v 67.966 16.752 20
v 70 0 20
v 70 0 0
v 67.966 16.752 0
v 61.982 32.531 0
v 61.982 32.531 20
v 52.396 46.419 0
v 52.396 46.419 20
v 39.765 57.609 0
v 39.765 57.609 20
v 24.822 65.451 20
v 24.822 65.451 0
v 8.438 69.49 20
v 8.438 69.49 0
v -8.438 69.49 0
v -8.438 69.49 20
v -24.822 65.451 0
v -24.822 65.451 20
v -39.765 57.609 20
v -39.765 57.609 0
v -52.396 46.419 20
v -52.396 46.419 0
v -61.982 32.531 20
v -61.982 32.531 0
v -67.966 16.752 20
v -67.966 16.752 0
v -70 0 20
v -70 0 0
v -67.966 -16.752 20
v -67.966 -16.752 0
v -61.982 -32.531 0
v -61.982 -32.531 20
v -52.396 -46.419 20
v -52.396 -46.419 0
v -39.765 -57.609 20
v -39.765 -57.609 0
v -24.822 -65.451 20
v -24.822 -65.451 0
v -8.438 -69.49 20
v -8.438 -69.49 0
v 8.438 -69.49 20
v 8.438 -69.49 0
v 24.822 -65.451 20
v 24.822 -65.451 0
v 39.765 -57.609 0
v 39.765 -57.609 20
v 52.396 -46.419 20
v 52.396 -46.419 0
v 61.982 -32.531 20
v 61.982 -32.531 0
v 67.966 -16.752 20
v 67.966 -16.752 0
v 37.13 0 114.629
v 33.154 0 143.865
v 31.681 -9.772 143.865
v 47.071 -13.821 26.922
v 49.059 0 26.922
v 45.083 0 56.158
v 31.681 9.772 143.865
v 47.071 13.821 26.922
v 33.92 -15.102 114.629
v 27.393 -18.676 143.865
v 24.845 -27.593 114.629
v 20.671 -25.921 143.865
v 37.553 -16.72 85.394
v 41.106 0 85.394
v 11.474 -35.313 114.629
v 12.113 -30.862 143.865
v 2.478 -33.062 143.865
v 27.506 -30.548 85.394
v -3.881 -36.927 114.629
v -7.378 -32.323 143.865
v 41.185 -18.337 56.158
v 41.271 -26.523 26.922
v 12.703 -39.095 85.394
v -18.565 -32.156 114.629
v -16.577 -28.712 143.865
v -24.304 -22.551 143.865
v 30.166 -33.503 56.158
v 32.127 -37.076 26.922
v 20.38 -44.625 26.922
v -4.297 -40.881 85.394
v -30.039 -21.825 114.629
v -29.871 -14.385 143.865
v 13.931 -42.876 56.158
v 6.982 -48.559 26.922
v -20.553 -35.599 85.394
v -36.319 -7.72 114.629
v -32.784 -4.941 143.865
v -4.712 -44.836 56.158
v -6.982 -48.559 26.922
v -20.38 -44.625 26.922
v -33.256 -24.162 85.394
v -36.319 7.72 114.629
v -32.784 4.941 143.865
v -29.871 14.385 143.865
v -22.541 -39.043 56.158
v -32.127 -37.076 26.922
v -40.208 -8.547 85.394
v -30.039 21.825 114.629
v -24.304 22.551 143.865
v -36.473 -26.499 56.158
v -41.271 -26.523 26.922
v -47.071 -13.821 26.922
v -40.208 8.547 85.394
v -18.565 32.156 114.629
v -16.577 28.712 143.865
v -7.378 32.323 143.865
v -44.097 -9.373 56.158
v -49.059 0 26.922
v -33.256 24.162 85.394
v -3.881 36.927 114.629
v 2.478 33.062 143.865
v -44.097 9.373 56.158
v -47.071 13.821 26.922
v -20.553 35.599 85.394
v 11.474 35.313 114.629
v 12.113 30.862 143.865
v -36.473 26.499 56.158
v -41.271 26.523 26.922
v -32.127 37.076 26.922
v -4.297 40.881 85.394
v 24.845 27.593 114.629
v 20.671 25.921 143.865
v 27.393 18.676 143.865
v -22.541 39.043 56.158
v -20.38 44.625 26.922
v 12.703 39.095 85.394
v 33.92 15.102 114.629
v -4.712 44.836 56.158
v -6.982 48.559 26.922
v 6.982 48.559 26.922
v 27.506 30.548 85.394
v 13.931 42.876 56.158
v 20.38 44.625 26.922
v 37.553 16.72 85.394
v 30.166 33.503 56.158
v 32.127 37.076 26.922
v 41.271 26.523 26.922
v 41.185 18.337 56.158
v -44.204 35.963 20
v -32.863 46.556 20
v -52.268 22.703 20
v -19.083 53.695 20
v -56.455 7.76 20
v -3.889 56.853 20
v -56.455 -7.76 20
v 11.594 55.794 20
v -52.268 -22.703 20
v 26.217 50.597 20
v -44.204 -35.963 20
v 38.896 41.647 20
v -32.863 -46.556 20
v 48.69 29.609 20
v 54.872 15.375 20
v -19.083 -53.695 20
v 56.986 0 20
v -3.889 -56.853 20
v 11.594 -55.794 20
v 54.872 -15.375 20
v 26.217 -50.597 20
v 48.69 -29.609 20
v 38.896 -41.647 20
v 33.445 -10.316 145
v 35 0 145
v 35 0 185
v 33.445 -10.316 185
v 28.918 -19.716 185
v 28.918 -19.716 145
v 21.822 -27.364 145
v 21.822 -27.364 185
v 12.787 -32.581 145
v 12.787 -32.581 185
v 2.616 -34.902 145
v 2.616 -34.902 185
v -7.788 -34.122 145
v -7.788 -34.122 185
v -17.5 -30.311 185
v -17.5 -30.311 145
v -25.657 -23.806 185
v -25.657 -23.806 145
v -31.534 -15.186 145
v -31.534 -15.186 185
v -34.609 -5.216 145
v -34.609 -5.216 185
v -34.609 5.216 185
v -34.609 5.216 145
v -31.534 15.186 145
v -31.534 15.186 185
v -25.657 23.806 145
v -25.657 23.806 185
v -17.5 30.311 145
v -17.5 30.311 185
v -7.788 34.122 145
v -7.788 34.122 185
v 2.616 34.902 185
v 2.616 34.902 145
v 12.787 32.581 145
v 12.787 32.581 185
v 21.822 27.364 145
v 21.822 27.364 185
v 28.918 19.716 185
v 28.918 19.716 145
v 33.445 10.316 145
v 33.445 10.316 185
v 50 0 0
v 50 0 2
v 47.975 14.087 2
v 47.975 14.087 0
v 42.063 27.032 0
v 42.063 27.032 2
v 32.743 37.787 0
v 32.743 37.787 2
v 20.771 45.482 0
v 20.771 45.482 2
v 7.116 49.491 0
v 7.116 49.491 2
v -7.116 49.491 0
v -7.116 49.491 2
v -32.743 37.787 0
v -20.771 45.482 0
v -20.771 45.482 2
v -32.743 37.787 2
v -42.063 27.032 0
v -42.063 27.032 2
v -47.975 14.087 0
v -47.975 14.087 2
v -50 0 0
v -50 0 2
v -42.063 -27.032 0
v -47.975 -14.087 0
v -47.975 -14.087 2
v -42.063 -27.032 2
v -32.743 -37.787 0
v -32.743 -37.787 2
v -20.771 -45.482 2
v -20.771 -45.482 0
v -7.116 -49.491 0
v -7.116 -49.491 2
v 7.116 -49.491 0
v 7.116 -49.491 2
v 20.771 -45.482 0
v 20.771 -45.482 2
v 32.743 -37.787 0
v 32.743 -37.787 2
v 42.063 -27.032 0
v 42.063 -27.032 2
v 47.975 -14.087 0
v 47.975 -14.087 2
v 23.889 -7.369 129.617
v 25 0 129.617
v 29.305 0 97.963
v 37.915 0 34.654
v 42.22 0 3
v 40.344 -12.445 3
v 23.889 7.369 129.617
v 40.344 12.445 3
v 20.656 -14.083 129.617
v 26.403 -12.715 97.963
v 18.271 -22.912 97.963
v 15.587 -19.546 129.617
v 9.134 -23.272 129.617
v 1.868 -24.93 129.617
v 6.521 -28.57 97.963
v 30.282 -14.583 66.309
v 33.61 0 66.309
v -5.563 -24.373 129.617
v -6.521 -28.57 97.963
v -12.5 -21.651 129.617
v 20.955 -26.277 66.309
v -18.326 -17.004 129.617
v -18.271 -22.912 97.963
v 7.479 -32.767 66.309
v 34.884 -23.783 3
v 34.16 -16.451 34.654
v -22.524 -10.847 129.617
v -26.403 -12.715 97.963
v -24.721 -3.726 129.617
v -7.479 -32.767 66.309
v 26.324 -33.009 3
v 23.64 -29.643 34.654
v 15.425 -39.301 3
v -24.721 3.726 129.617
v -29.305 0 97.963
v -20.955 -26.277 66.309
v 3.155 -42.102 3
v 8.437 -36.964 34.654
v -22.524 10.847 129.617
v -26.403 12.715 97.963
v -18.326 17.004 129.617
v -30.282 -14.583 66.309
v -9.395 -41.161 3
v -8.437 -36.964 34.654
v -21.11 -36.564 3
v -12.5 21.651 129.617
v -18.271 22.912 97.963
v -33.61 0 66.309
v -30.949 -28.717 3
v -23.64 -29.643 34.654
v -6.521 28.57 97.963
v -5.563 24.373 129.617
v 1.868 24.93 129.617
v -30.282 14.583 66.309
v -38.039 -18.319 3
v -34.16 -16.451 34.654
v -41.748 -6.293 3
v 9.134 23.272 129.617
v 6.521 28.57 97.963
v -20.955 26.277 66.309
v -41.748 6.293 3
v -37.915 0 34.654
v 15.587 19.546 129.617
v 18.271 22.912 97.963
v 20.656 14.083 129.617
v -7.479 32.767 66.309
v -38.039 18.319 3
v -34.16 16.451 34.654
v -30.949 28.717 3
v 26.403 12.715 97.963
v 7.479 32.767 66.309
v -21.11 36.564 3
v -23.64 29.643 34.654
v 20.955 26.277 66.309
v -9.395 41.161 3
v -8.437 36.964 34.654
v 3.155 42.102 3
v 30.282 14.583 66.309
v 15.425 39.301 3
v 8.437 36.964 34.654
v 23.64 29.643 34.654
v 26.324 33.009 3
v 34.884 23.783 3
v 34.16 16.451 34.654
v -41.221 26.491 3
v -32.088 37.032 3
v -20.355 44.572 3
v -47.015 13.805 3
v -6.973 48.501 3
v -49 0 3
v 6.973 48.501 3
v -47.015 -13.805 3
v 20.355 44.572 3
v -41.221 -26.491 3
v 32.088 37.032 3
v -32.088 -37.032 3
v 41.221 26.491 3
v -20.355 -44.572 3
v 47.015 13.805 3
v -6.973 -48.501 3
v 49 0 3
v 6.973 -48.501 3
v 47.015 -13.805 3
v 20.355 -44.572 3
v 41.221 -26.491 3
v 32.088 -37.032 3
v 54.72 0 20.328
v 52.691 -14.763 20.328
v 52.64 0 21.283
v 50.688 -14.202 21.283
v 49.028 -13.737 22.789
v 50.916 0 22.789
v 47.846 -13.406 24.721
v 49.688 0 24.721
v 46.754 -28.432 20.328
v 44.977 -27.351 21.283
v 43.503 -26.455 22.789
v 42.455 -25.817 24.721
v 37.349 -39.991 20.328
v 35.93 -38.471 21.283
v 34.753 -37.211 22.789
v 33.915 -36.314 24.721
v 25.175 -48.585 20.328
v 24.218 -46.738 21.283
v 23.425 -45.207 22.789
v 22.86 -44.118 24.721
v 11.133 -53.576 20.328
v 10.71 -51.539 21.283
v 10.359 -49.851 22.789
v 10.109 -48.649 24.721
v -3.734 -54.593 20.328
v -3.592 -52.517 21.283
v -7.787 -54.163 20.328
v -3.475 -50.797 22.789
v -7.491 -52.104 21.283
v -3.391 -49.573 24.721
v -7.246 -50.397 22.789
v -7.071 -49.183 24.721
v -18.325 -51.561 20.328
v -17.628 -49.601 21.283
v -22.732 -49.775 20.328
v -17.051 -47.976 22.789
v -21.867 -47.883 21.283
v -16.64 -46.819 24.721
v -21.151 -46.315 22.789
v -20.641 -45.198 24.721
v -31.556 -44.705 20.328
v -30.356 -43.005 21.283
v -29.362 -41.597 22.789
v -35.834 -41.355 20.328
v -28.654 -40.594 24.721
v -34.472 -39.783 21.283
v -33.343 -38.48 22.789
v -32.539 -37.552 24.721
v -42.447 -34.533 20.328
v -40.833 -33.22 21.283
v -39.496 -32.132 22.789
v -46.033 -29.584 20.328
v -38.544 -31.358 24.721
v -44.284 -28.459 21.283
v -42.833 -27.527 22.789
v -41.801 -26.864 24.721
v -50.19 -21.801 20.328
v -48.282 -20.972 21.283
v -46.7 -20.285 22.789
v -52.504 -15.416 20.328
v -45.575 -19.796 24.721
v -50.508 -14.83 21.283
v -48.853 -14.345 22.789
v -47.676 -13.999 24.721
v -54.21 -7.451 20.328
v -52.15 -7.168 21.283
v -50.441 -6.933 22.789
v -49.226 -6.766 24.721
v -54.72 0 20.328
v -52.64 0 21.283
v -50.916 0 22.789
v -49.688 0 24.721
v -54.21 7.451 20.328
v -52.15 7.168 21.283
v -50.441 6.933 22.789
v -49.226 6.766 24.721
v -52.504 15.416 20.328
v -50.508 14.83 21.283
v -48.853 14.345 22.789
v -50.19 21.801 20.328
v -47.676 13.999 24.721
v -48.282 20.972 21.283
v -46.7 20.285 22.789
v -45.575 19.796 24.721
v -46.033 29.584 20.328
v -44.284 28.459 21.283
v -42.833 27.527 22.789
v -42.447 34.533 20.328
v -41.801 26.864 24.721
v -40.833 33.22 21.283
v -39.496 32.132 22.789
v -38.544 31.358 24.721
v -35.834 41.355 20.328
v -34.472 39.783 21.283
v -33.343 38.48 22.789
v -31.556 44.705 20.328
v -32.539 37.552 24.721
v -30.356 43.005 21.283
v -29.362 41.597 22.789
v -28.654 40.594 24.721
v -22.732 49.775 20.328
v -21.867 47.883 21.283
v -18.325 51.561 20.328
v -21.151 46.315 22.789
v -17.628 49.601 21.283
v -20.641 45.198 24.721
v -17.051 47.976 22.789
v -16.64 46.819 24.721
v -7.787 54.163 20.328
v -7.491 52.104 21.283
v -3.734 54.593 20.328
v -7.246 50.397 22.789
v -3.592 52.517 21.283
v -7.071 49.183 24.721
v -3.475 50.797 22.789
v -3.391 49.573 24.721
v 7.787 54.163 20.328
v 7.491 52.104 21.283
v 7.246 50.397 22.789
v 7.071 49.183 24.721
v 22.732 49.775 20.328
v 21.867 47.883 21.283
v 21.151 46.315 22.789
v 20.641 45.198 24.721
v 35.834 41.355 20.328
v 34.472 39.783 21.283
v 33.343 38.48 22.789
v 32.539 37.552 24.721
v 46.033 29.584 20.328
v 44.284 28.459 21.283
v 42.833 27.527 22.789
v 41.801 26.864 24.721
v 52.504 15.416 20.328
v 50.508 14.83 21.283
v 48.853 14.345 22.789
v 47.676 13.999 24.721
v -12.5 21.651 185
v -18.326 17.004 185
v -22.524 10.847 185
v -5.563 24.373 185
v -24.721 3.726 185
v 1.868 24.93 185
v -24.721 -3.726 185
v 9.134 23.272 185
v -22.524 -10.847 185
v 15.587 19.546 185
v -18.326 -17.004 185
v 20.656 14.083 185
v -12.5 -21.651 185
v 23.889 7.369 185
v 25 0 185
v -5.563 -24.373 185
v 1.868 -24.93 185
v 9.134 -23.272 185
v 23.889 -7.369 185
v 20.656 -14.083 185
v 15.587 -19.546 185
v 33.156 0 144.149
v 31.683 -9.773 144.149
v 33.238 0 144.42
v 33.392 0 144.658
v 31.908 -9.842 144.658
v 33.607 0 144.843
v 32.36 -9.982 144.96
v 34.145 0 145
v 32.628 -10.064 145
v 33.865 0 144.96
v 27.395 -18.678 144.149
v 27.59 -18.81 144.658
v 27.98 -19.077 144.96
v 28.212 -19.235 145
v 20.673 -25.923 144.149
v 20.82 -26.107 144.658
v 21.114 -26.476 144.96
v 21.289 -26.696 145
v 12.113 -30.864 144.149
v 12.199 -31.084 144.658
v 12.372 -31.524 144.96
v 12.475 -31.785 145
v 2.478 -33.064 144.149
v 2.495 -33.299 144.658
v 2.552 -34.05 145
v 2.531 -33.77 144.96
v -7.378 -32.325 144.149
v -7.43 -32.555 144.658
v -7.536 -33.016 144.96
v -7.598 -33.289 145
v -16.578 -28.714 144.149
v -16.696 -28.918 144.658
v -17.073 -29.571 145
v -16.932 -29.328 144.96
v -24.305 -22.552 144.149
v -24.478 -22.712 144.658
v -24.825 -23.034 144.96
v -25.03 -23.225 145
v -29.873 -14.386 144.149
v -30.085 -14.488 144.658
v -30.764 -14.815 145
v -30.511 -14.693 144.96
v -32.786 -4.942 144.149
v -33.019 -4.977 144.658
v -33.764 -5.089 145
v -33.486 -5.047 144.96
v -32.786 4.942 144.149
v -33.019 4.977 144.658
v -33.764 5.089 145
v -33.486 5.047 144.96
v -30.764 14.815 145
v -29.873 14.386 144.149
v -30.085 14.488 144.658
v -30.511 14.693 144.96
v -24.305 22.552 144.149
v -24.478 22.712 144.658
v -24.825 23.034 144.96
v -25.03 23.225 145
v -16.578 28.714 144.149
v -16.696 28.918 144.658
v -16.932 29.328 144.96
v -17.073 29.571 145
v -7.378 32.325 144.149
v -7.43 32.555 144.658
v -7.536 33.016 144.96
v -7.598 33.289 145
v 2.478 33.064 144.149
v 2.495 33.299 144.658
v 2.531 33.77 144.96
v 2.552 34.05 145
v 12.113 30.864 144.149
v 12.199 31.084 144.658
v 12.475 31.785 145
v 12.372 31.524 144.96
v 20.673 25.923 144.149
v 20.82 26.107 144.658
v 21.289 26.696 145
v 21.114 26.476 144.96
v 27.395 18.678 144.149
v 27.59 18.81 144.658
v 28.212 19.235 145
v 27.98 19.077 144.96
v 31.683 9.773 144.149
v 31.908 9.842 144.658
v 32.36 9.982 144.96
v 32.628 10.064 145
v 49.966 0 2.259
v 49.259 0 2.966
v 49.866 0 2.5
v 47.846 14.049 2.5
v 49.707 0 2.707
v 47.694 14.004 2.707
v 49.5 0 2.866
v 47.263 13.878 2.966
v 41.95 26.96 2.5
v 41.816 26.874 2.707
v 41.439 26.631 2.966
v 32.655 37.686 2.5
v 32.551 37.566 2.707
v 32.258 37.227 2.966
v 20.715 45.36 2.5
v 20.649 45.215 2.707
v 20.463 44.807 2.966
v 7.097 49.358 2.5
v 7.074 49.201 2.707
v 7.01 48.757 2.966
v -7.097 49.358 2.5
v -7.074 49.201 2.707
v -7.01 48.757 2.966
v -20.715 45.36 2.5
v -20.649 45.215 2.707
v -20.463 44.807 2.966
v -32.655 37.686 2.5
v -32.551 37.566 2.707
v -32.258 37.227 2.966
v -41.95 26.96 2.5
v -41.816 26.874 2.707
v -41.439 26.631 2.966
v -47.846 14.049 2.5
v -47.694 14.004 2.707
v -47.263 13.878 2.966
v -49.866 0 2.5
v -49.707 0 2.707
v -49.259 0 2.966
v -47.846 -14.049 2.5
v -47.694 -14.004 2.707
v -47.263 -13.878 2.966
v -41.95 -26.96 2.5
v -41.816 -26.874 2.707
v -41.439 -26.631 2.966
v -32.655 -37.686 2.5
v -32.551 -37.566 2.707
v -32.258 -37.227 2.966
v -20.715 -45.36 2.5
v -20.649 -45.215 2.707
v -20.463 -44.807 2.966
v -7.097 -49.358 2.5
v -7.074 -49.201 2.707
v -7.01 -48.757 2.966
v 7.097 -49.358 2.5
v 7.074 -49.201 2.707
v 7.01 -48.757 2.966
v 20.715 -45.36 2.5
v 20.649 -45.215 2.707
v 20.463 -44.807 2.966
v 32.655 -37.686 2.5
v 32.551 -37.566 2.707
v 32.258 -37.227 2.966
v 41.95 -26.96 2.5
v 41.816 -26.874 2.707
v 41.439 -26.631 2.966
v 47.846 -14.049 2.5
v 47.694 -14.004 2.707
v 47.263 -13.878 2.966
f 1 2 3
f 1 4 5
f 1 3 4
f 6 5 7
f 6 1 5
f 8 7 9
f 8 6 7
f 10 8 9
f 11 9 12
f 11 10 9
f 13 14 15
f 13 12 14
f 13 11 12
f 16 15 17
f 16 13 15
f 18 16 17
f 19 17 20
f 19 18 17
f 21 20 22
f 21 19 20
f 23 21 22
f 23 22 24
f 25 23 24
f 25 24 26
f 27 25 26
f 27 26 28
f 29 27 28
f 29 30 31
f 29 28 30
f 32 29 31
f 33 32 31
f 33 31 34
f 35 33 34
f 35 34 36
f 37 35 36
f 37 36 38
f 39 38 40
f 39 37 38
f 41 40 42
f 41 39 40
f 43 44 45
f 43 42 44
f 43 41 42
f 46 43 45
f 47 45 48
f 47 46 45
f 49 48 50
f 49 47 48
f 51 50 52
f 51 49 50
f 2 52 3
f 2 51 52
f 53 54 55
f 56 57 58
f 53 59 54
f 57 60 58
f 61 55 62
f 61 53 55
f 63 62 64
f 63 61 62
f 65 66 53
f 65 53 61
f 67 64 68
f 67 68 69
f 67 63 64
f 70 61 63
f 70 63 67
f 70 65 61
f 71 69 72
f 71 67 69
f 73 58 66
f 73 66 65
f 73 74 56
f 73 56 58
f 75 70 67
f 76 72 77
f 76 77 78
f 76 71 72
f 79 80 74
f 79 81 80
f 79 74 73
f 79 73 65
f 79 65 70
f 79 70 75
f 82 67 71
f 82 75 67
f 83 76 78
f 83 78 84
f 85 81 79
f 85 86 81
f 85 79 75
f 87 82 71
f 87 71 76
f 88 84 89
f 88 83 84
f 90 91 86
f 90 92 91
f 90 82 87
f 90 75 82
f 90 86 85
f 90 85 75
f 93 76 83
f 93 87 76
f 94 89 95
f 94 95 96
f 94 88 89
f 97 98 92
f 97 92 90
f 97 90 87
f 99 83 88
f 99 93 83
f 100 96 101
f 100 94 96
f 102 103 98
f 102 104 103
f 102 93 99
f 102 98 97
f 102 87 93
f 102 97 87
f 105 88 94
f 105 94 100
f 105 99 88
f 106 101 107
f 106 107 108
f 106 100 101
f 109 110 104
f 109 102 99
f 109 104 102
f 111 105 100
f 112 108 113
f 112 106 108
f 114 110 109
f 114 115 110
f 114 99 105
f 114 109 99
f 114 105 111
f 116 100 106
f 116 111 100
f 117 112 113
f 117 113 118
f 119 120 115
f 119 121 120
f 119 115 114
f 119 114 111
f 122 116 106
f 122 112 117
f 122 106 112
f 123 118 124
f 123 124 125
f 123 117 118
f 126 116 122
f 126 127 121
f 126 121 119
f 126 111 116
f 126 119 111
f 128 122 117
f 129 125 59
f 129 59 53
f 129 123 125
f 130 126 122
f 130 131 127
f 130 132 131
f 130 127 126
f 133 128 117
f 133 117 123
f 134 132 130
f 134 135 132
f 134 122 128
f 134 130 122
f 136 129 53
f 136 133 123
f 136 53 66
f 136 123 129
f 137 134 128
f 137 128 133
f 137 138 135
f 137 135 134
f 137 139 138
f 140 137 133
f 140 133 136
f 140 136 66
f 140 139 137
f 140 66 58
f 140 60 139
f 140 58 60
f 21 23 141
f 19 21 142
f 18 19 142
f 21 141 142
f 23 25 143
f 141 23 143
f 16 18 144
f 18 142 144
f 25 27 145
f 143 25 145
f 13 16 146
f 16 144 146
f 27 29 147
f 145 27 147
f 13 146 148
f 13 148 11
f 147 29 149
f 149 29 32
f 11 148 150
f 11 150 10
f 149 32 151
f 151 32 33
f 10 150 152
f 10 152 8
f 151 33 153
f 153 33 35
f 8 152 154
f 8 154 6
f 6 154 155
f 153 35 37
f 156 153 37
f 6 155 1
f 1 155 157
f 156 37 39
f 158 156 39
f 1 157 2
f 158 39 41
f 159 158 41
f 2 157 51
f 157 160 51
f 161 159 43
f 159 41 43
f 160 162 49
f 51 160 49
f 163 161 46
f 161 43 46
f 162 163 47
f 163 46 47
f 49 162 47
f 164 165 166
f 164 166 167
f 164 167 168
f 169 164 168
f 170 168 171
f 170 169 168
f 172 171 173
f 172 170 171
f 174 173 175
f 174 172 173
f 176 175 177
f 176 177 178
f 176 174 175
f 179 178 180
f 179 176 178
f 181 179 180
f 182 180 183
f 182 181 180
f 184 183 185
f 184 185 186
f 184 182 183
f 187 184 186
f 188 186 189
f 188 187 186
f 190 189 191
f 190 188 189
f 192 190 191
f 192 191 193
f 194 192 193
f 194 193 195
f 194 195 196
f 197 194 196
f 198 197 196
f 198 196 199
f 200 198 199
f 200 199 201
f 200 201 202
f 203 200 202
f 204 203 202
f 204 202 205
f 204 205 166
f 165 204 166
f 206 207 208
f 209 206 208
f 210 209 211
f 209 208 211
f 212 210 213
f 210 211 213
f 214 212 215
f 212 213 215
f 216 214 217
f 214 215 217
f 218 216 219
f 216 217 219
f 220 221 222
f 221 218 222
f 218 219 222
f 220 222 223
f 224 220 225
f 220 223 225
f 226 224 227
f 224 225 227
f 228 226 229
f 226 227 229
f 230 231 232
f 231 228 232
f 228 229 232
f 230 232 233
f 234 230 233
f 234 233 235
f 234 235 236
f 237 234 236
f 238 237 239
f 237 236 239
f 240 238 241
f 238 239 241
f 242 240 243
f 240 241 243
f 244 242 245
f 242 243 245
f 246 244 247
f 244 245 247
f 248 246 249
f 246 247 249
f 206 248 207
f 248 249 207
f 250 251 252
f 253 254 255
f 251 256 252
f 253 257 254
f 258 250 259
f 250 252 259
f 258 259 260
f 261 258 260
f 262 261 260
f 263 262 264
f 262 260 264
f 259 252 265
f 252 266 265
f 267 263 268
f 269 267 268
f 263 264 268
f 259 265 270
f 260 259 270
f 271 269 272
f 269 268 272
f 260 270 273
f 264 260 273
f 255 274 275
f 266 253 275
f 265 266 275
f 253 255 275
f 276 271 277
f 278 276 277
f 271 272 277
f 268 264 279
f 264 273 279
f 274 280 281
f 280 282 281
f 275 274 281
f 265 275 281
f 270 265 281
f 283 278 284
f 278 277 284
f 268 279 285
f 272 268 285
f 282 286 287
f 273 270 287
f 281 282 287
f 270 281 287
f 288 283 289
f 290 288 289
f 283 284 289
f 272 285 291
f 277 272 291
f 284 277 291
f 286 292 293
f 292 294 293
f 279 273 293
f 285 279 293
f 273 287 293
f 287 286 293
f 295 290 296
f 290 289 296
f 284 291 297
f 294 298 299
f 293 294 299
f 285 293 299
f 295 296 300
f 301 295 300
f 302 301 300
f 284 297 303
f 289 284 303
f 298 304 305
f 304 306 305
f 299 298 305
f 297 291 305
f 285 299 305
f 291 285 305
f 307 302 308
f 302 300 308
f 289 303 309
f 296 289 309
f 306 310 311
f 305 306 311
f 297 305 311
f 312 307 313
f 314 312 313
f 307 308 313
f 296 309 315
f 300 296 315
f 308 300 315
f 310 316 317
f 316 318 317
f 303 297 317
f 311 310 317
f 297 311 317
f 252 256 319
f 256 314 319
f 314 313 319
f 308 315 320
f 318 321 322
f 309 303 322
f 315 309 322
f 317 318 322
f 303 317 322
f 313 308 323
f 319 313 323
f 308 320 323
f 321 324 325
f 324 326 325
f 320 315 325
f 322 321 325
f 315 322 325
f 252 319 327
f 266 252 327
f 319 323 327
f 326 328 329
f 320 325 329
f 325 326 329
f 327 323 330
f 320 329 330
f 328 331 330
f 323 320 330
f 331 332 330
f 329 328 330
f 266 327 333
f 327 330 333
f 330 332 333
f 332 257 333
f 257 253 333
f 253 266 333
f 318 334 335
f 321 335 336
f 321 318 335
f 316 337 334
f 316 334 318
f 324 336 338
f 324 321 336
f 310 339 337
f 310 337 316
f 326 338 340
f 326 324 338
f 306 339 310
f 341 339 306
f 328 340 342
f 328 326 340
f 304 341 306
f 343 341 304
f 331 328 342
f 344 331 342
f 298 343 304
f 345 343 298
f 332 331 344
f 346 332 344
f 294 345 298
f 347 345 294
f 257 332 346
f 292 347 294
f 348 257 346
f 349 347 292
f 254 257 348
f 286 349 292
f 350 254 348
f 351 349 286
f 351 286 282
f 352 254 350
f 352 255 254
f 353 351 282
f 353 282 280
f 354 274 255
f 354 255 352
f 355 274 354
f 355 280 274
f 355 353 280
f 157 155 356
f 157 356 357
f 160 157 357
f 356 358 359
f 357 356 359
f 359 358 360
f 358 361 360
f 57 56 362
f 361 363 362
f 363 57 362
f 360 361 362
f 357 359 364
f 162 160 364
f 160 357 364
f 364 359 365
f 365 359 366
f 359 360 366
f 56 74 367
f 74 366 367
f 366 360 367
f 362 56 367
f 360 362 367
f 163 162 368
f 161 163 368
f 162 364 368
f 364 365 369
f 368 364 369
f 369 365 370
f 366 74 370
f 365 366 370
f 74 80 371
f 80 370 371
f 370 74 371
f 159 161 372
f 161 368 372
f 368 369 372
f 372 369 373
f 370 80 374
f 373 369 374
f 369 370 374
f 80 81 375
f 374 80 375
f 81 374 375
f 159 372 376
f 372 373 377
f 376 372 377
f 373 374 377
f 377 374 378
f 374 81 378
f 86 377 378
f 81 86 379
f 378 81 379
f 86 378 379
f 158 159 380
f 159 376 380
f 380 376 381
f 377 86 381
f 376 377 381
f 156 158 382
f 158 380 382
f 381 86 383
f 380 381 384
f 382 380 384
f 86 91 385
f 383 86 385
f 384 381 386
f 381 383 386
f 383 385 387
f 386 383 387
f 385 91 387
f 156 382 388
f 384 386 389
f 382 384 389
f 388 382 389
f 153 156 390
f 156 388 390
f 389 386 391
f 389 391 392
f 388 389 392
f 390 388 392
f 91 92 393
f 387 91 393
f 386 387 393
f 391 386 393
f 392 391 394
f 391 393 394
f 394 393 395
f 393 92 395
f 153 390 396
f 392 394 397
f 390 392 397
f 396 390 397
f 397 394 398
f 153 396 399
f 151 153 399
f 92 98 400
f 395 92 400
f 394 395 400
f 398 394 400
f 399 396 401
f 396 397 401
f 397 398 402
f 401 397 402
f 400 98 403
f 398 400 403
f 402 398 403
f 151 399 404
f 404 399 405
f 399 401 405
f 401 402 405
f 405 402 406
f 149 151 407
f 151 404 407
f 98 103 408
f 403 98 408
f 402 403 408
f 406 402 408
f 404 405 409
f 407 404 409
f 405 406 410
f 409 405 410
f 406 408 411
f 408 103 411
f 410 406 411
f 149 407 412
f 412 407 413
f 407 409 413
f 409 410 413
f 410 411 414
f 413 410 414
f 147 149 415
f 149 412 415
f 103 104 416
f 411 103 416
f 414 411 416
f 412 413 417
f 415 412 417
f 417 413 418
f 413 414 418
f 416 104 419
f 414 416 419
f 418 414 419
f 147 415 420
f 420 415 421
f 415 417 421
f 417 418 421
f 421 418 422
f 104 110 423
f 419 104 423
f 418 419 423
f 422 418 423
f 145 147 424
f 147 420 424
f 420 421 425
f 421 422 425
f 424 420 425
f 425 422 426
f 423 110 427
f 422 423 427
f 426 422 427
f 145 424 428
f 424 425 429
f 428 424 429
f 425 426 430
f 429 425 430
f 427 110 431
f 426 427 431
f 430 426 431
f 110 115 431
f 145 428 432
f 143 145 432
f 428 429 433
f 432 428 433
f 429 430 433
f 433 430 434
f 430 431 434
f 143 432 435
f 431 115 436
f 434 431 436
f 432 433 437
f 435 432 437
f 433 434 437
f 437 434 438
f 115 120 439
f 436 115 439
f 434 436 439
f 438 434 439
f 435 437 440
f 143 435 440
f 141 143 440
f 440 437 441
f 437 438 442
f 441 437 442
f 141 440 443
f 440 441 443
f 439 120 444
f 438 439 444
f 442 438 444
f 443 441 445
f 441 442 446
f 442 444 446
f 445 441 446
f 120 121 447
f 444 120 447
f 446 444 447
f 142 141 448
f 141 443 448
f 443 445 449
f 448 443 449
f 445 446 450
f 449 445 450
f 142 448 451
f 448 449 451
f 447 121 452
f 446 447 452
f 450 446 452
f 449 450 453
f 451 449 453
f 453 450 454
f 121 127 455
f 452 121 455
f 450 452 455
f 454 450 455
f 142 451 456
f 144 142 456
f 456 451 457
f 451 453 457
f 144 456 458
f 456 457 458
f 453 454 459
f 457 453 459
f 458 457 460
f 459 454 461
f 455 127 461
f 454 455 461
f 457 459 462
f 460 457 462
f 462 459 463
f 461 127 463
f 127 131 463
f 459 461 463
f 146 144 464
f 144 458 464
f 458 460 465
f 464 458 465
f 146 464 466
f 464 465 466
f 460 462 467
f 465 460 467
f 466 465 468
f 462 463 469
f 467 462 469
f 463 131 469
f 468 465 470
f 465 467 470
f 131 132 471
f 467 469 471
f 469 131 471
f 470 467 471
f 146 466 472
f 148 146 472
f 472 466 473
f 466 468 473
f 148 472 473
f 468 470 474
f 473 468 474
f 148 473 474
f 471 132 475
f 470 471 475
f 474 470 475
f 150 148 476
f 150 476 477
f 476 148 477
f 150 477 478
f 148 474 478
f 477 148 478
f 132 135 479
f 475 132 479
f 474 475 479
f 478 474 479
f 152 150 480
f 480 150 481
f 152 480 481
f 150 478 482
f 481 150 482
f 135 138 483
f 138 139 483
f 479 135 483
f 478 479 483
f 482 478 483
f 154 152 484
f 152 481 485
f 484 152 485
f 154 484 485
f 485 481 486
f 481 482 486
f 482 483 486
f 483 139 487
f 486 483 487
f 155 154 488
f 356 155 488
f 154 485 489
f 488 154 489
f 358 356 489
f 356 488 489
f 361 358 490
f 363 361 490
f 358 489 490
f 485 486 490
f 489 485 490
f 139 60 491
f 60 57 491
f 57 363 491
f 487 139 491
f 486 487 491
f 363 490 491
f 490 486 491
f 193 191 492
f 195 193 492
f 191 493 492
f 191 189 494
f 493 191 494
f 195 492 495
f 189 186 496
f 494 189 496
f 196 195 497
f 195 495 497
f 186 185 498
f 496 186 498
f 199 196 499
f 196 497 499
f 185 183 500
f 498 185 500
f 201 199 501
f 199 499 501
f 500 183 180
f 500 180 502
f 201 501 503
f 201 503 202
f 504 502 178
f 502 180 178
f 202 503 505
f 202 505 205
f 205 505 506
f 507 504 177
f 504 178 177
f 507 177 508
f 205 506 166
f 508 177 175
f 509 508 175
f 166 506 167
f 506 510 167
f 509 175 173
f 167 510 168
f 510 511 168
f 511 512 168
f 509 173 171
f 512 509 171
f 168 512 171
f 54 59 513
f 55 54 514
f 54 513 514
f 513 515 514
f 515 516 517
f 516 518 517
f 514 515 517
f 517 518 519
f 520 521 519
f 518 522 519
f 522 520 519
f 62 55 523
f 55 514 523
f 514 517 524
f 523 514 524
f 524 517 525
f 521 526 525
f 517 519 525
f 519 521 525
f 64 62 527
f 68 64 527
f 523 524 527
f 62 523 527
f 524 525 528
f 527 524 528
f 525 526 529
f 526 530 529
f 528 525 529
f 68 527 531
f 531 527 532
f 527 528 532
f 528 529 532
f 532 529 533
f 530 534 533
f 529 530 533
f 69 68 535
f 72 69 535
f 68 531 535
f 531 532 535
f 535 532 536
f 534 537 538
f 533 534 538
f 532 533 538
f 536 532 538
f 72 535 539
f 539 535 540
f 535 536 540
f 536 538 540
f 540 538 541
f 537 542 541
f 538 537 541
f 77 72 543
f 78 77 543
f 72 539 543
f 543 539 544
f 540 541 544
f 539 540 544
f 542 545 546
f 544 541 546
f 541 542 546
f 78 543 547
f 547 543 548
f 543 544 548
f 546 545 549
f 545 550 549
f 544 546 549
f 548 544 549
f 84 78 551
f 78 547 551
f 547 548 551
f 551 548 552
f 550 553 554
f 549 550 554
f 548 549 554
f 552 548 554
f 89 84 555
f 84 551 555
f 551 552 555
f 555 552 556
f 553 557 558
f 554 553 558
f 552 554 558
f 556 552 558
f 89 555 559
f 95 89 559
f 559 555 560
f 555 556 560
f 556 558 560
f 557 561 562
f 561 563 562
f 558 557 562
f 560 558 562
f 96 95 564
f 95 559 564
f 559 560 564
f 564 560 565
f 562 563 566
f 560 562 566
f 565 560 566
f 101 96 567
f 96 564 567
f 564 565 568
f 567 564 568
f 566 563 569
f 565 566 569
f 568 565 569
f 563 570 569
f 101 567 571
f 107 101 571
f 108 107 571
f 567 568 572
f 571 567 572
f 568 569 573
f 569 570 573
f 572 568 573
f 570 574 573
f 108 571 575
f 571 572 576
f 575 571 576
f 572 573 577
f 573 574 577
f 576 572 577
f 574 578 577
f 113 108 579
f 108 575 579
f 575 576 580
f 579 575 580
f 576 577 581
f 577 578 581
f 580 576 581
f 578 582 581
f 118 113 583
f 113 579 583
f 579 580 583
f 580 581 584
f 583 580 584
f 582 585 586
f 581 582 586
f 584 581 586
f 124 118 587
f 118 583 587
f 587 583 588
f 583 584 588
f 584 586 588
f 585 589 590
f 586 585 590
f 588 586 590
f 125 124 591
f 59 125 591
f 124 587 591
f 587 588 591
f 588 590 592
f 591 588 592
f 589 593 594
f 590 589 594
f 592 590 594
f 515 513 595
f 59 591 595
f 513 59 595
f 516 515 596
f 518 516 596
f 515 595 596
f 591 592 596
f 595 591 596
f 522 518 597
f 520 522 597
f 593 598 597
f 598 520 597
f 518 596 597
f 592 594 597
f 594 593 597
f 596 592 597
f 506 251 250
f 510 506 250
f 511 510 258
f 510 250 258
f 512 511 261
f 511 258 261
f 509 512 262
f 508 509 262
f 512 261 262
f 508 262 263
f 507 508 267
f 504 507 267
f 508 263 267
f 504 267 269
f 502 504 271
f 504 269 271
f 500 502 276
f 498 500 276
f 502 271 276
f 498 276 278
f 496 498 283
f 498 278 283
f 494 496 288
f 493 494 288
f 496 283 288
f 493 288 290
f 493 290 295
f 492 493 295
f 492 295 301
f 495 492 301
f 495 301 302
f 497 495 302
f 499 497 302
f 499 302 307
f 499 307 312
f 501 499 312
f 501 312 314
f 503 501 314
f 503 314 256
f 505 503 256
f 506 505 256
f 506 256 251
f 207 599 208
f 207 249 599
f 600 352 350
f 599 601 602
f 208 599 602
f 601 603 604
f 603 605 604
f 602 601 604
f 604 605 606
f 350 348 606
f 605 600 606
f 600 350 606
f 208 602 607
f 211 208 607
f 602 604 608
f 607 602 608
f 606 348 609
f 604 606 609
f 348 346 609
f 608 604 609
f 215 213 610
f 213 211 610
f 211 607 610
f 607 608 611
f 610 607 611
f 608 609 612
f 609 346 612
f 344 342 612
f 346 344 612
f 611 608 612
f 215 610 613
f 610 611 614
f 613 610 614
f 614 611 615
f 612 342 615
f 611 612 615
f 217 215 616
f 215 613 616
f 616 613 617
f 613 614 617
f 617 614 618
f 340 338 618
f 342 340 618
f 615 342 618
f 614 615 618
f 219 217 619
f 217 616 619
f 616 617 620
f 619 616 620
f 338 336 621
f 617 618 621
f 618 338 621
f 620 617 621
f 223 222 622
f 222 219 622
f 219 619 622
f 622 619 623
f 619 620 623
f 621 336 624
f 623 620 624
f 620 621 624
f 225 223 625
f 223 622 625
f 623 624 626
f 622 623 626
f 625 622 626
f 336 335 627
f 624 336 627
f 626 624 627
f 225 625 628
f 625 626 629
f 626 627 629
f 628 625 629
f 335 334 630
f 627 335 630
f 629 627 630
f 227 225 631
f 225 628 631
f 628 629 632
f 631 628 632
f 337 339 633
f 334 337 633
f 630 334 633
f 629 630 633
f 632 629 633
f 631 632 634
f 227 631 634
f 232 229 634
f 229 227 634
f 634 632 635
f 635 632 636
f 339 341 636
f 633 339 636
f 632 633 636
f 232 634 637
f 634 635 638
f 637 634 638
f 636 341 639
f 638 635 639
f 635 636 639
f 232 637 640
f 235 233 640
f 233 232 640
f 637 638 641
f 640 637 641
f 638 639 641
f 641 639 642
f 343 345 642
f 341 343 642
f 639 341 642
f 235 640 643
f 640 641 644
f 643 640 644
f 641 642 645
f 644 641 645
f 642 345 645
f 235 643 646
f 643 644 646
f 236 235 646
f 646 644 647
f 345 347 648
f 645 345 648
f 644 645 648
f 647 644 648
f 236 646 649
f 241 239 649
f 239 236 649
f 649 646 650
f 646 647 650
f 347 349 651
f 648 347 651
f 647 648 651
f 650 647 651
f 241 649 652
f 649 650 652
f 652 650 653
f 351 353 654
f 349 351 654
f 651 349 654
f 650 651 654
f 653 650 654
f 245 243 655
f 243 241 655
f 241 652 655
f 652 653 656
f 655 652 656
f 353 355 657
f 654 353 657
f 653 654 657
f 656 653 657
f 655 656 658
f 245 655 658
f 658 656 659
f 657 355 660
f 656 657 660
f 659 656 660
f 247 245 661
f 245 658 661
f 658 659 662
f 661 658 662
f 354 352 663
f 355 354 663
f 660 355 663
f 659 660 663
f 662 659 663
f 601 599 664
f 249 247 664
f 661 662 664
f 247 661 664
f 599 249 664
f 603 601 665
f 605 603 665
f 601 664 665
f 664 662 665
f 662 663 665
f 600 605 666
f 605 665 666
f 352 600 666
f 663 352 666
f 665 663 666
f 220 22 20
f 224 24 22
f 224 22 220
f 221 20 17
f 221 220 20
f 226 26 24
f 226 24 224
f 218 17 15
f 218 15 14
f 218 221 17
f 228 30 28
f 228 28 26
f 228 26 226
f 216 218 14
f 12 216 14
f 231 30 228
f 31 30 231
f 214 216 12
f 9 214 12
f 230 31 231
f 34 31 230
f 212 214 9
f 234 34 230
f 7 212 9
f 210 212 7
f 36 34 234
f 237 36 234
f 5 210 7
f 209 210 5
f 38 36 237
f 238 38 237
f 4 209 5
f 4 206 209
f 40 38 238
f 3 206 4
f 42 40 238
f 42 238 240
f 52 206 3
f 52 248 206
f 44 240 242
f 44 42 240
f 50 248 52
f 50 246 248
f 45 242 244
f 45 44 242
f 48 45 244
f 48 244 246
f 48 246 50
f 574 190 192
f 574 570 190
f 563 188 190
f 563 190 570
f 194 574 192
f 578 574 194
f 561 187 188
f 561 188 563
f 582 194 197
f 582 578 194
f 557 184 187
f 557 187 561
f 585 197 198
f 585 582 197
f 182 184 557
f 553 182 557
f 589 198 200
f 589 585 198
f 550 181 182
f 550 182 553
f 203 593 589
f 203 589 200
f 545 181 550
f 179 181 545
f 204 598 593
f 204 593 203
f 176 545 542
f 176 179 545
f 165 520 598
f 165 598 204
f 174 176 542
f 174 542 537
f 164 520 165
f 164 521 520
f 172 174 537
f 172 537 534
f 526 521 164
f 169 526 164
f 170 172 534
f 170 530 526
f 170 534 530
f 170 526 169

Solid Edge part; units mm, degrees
sketch "Sketch1" plane through (0, 0, 0) normal (0, -1, 0) x (1, 0, 0)
  line L0 (25, 129.6172) -> (42.2199, 3)
  line L1 (50, 3) -> (42.2199, 3)
  line L2 (50, 0) -> (50, 3)
  line L3 (50, 0) -> (70, 0)
  line L4 (70, 0) -> (70, 20)
  line L5 (70, 20) -> (50, 20)
  line L6 (33, 145) -> (50, 20)
  line L7 (35, 145) -> (33, 145)
  line L8 (35, 185) -> (35, 145)
  line L9 (25, 185) -> (35, 185)
  line L10 (25, 185) -> (25, 129.6172)
  dimension "D1" = 50
  dimension "D2" = 70
  dimension "D3" = 20
  dimension "D4" = 3
  dimension "D5" = 20
  dimension "D6" = 25
  dimension "D7" = 35
  dimension "D8" = 10
  dimension "D9" = 40
  dimension "D10" = 2
  dimension "D11" = 185
revolve "RevolvedProtrusion1" add sketch "Sketch1" angle 360 about axis through (0, 0, 54) along (0, 0, -1)
fillet "Round_1" radius 8 1 edges at (-50, 0, 20)
fillet "Round_1" radius 1 2 edges at (-50, 0, 3) (-33, 0, 145)
